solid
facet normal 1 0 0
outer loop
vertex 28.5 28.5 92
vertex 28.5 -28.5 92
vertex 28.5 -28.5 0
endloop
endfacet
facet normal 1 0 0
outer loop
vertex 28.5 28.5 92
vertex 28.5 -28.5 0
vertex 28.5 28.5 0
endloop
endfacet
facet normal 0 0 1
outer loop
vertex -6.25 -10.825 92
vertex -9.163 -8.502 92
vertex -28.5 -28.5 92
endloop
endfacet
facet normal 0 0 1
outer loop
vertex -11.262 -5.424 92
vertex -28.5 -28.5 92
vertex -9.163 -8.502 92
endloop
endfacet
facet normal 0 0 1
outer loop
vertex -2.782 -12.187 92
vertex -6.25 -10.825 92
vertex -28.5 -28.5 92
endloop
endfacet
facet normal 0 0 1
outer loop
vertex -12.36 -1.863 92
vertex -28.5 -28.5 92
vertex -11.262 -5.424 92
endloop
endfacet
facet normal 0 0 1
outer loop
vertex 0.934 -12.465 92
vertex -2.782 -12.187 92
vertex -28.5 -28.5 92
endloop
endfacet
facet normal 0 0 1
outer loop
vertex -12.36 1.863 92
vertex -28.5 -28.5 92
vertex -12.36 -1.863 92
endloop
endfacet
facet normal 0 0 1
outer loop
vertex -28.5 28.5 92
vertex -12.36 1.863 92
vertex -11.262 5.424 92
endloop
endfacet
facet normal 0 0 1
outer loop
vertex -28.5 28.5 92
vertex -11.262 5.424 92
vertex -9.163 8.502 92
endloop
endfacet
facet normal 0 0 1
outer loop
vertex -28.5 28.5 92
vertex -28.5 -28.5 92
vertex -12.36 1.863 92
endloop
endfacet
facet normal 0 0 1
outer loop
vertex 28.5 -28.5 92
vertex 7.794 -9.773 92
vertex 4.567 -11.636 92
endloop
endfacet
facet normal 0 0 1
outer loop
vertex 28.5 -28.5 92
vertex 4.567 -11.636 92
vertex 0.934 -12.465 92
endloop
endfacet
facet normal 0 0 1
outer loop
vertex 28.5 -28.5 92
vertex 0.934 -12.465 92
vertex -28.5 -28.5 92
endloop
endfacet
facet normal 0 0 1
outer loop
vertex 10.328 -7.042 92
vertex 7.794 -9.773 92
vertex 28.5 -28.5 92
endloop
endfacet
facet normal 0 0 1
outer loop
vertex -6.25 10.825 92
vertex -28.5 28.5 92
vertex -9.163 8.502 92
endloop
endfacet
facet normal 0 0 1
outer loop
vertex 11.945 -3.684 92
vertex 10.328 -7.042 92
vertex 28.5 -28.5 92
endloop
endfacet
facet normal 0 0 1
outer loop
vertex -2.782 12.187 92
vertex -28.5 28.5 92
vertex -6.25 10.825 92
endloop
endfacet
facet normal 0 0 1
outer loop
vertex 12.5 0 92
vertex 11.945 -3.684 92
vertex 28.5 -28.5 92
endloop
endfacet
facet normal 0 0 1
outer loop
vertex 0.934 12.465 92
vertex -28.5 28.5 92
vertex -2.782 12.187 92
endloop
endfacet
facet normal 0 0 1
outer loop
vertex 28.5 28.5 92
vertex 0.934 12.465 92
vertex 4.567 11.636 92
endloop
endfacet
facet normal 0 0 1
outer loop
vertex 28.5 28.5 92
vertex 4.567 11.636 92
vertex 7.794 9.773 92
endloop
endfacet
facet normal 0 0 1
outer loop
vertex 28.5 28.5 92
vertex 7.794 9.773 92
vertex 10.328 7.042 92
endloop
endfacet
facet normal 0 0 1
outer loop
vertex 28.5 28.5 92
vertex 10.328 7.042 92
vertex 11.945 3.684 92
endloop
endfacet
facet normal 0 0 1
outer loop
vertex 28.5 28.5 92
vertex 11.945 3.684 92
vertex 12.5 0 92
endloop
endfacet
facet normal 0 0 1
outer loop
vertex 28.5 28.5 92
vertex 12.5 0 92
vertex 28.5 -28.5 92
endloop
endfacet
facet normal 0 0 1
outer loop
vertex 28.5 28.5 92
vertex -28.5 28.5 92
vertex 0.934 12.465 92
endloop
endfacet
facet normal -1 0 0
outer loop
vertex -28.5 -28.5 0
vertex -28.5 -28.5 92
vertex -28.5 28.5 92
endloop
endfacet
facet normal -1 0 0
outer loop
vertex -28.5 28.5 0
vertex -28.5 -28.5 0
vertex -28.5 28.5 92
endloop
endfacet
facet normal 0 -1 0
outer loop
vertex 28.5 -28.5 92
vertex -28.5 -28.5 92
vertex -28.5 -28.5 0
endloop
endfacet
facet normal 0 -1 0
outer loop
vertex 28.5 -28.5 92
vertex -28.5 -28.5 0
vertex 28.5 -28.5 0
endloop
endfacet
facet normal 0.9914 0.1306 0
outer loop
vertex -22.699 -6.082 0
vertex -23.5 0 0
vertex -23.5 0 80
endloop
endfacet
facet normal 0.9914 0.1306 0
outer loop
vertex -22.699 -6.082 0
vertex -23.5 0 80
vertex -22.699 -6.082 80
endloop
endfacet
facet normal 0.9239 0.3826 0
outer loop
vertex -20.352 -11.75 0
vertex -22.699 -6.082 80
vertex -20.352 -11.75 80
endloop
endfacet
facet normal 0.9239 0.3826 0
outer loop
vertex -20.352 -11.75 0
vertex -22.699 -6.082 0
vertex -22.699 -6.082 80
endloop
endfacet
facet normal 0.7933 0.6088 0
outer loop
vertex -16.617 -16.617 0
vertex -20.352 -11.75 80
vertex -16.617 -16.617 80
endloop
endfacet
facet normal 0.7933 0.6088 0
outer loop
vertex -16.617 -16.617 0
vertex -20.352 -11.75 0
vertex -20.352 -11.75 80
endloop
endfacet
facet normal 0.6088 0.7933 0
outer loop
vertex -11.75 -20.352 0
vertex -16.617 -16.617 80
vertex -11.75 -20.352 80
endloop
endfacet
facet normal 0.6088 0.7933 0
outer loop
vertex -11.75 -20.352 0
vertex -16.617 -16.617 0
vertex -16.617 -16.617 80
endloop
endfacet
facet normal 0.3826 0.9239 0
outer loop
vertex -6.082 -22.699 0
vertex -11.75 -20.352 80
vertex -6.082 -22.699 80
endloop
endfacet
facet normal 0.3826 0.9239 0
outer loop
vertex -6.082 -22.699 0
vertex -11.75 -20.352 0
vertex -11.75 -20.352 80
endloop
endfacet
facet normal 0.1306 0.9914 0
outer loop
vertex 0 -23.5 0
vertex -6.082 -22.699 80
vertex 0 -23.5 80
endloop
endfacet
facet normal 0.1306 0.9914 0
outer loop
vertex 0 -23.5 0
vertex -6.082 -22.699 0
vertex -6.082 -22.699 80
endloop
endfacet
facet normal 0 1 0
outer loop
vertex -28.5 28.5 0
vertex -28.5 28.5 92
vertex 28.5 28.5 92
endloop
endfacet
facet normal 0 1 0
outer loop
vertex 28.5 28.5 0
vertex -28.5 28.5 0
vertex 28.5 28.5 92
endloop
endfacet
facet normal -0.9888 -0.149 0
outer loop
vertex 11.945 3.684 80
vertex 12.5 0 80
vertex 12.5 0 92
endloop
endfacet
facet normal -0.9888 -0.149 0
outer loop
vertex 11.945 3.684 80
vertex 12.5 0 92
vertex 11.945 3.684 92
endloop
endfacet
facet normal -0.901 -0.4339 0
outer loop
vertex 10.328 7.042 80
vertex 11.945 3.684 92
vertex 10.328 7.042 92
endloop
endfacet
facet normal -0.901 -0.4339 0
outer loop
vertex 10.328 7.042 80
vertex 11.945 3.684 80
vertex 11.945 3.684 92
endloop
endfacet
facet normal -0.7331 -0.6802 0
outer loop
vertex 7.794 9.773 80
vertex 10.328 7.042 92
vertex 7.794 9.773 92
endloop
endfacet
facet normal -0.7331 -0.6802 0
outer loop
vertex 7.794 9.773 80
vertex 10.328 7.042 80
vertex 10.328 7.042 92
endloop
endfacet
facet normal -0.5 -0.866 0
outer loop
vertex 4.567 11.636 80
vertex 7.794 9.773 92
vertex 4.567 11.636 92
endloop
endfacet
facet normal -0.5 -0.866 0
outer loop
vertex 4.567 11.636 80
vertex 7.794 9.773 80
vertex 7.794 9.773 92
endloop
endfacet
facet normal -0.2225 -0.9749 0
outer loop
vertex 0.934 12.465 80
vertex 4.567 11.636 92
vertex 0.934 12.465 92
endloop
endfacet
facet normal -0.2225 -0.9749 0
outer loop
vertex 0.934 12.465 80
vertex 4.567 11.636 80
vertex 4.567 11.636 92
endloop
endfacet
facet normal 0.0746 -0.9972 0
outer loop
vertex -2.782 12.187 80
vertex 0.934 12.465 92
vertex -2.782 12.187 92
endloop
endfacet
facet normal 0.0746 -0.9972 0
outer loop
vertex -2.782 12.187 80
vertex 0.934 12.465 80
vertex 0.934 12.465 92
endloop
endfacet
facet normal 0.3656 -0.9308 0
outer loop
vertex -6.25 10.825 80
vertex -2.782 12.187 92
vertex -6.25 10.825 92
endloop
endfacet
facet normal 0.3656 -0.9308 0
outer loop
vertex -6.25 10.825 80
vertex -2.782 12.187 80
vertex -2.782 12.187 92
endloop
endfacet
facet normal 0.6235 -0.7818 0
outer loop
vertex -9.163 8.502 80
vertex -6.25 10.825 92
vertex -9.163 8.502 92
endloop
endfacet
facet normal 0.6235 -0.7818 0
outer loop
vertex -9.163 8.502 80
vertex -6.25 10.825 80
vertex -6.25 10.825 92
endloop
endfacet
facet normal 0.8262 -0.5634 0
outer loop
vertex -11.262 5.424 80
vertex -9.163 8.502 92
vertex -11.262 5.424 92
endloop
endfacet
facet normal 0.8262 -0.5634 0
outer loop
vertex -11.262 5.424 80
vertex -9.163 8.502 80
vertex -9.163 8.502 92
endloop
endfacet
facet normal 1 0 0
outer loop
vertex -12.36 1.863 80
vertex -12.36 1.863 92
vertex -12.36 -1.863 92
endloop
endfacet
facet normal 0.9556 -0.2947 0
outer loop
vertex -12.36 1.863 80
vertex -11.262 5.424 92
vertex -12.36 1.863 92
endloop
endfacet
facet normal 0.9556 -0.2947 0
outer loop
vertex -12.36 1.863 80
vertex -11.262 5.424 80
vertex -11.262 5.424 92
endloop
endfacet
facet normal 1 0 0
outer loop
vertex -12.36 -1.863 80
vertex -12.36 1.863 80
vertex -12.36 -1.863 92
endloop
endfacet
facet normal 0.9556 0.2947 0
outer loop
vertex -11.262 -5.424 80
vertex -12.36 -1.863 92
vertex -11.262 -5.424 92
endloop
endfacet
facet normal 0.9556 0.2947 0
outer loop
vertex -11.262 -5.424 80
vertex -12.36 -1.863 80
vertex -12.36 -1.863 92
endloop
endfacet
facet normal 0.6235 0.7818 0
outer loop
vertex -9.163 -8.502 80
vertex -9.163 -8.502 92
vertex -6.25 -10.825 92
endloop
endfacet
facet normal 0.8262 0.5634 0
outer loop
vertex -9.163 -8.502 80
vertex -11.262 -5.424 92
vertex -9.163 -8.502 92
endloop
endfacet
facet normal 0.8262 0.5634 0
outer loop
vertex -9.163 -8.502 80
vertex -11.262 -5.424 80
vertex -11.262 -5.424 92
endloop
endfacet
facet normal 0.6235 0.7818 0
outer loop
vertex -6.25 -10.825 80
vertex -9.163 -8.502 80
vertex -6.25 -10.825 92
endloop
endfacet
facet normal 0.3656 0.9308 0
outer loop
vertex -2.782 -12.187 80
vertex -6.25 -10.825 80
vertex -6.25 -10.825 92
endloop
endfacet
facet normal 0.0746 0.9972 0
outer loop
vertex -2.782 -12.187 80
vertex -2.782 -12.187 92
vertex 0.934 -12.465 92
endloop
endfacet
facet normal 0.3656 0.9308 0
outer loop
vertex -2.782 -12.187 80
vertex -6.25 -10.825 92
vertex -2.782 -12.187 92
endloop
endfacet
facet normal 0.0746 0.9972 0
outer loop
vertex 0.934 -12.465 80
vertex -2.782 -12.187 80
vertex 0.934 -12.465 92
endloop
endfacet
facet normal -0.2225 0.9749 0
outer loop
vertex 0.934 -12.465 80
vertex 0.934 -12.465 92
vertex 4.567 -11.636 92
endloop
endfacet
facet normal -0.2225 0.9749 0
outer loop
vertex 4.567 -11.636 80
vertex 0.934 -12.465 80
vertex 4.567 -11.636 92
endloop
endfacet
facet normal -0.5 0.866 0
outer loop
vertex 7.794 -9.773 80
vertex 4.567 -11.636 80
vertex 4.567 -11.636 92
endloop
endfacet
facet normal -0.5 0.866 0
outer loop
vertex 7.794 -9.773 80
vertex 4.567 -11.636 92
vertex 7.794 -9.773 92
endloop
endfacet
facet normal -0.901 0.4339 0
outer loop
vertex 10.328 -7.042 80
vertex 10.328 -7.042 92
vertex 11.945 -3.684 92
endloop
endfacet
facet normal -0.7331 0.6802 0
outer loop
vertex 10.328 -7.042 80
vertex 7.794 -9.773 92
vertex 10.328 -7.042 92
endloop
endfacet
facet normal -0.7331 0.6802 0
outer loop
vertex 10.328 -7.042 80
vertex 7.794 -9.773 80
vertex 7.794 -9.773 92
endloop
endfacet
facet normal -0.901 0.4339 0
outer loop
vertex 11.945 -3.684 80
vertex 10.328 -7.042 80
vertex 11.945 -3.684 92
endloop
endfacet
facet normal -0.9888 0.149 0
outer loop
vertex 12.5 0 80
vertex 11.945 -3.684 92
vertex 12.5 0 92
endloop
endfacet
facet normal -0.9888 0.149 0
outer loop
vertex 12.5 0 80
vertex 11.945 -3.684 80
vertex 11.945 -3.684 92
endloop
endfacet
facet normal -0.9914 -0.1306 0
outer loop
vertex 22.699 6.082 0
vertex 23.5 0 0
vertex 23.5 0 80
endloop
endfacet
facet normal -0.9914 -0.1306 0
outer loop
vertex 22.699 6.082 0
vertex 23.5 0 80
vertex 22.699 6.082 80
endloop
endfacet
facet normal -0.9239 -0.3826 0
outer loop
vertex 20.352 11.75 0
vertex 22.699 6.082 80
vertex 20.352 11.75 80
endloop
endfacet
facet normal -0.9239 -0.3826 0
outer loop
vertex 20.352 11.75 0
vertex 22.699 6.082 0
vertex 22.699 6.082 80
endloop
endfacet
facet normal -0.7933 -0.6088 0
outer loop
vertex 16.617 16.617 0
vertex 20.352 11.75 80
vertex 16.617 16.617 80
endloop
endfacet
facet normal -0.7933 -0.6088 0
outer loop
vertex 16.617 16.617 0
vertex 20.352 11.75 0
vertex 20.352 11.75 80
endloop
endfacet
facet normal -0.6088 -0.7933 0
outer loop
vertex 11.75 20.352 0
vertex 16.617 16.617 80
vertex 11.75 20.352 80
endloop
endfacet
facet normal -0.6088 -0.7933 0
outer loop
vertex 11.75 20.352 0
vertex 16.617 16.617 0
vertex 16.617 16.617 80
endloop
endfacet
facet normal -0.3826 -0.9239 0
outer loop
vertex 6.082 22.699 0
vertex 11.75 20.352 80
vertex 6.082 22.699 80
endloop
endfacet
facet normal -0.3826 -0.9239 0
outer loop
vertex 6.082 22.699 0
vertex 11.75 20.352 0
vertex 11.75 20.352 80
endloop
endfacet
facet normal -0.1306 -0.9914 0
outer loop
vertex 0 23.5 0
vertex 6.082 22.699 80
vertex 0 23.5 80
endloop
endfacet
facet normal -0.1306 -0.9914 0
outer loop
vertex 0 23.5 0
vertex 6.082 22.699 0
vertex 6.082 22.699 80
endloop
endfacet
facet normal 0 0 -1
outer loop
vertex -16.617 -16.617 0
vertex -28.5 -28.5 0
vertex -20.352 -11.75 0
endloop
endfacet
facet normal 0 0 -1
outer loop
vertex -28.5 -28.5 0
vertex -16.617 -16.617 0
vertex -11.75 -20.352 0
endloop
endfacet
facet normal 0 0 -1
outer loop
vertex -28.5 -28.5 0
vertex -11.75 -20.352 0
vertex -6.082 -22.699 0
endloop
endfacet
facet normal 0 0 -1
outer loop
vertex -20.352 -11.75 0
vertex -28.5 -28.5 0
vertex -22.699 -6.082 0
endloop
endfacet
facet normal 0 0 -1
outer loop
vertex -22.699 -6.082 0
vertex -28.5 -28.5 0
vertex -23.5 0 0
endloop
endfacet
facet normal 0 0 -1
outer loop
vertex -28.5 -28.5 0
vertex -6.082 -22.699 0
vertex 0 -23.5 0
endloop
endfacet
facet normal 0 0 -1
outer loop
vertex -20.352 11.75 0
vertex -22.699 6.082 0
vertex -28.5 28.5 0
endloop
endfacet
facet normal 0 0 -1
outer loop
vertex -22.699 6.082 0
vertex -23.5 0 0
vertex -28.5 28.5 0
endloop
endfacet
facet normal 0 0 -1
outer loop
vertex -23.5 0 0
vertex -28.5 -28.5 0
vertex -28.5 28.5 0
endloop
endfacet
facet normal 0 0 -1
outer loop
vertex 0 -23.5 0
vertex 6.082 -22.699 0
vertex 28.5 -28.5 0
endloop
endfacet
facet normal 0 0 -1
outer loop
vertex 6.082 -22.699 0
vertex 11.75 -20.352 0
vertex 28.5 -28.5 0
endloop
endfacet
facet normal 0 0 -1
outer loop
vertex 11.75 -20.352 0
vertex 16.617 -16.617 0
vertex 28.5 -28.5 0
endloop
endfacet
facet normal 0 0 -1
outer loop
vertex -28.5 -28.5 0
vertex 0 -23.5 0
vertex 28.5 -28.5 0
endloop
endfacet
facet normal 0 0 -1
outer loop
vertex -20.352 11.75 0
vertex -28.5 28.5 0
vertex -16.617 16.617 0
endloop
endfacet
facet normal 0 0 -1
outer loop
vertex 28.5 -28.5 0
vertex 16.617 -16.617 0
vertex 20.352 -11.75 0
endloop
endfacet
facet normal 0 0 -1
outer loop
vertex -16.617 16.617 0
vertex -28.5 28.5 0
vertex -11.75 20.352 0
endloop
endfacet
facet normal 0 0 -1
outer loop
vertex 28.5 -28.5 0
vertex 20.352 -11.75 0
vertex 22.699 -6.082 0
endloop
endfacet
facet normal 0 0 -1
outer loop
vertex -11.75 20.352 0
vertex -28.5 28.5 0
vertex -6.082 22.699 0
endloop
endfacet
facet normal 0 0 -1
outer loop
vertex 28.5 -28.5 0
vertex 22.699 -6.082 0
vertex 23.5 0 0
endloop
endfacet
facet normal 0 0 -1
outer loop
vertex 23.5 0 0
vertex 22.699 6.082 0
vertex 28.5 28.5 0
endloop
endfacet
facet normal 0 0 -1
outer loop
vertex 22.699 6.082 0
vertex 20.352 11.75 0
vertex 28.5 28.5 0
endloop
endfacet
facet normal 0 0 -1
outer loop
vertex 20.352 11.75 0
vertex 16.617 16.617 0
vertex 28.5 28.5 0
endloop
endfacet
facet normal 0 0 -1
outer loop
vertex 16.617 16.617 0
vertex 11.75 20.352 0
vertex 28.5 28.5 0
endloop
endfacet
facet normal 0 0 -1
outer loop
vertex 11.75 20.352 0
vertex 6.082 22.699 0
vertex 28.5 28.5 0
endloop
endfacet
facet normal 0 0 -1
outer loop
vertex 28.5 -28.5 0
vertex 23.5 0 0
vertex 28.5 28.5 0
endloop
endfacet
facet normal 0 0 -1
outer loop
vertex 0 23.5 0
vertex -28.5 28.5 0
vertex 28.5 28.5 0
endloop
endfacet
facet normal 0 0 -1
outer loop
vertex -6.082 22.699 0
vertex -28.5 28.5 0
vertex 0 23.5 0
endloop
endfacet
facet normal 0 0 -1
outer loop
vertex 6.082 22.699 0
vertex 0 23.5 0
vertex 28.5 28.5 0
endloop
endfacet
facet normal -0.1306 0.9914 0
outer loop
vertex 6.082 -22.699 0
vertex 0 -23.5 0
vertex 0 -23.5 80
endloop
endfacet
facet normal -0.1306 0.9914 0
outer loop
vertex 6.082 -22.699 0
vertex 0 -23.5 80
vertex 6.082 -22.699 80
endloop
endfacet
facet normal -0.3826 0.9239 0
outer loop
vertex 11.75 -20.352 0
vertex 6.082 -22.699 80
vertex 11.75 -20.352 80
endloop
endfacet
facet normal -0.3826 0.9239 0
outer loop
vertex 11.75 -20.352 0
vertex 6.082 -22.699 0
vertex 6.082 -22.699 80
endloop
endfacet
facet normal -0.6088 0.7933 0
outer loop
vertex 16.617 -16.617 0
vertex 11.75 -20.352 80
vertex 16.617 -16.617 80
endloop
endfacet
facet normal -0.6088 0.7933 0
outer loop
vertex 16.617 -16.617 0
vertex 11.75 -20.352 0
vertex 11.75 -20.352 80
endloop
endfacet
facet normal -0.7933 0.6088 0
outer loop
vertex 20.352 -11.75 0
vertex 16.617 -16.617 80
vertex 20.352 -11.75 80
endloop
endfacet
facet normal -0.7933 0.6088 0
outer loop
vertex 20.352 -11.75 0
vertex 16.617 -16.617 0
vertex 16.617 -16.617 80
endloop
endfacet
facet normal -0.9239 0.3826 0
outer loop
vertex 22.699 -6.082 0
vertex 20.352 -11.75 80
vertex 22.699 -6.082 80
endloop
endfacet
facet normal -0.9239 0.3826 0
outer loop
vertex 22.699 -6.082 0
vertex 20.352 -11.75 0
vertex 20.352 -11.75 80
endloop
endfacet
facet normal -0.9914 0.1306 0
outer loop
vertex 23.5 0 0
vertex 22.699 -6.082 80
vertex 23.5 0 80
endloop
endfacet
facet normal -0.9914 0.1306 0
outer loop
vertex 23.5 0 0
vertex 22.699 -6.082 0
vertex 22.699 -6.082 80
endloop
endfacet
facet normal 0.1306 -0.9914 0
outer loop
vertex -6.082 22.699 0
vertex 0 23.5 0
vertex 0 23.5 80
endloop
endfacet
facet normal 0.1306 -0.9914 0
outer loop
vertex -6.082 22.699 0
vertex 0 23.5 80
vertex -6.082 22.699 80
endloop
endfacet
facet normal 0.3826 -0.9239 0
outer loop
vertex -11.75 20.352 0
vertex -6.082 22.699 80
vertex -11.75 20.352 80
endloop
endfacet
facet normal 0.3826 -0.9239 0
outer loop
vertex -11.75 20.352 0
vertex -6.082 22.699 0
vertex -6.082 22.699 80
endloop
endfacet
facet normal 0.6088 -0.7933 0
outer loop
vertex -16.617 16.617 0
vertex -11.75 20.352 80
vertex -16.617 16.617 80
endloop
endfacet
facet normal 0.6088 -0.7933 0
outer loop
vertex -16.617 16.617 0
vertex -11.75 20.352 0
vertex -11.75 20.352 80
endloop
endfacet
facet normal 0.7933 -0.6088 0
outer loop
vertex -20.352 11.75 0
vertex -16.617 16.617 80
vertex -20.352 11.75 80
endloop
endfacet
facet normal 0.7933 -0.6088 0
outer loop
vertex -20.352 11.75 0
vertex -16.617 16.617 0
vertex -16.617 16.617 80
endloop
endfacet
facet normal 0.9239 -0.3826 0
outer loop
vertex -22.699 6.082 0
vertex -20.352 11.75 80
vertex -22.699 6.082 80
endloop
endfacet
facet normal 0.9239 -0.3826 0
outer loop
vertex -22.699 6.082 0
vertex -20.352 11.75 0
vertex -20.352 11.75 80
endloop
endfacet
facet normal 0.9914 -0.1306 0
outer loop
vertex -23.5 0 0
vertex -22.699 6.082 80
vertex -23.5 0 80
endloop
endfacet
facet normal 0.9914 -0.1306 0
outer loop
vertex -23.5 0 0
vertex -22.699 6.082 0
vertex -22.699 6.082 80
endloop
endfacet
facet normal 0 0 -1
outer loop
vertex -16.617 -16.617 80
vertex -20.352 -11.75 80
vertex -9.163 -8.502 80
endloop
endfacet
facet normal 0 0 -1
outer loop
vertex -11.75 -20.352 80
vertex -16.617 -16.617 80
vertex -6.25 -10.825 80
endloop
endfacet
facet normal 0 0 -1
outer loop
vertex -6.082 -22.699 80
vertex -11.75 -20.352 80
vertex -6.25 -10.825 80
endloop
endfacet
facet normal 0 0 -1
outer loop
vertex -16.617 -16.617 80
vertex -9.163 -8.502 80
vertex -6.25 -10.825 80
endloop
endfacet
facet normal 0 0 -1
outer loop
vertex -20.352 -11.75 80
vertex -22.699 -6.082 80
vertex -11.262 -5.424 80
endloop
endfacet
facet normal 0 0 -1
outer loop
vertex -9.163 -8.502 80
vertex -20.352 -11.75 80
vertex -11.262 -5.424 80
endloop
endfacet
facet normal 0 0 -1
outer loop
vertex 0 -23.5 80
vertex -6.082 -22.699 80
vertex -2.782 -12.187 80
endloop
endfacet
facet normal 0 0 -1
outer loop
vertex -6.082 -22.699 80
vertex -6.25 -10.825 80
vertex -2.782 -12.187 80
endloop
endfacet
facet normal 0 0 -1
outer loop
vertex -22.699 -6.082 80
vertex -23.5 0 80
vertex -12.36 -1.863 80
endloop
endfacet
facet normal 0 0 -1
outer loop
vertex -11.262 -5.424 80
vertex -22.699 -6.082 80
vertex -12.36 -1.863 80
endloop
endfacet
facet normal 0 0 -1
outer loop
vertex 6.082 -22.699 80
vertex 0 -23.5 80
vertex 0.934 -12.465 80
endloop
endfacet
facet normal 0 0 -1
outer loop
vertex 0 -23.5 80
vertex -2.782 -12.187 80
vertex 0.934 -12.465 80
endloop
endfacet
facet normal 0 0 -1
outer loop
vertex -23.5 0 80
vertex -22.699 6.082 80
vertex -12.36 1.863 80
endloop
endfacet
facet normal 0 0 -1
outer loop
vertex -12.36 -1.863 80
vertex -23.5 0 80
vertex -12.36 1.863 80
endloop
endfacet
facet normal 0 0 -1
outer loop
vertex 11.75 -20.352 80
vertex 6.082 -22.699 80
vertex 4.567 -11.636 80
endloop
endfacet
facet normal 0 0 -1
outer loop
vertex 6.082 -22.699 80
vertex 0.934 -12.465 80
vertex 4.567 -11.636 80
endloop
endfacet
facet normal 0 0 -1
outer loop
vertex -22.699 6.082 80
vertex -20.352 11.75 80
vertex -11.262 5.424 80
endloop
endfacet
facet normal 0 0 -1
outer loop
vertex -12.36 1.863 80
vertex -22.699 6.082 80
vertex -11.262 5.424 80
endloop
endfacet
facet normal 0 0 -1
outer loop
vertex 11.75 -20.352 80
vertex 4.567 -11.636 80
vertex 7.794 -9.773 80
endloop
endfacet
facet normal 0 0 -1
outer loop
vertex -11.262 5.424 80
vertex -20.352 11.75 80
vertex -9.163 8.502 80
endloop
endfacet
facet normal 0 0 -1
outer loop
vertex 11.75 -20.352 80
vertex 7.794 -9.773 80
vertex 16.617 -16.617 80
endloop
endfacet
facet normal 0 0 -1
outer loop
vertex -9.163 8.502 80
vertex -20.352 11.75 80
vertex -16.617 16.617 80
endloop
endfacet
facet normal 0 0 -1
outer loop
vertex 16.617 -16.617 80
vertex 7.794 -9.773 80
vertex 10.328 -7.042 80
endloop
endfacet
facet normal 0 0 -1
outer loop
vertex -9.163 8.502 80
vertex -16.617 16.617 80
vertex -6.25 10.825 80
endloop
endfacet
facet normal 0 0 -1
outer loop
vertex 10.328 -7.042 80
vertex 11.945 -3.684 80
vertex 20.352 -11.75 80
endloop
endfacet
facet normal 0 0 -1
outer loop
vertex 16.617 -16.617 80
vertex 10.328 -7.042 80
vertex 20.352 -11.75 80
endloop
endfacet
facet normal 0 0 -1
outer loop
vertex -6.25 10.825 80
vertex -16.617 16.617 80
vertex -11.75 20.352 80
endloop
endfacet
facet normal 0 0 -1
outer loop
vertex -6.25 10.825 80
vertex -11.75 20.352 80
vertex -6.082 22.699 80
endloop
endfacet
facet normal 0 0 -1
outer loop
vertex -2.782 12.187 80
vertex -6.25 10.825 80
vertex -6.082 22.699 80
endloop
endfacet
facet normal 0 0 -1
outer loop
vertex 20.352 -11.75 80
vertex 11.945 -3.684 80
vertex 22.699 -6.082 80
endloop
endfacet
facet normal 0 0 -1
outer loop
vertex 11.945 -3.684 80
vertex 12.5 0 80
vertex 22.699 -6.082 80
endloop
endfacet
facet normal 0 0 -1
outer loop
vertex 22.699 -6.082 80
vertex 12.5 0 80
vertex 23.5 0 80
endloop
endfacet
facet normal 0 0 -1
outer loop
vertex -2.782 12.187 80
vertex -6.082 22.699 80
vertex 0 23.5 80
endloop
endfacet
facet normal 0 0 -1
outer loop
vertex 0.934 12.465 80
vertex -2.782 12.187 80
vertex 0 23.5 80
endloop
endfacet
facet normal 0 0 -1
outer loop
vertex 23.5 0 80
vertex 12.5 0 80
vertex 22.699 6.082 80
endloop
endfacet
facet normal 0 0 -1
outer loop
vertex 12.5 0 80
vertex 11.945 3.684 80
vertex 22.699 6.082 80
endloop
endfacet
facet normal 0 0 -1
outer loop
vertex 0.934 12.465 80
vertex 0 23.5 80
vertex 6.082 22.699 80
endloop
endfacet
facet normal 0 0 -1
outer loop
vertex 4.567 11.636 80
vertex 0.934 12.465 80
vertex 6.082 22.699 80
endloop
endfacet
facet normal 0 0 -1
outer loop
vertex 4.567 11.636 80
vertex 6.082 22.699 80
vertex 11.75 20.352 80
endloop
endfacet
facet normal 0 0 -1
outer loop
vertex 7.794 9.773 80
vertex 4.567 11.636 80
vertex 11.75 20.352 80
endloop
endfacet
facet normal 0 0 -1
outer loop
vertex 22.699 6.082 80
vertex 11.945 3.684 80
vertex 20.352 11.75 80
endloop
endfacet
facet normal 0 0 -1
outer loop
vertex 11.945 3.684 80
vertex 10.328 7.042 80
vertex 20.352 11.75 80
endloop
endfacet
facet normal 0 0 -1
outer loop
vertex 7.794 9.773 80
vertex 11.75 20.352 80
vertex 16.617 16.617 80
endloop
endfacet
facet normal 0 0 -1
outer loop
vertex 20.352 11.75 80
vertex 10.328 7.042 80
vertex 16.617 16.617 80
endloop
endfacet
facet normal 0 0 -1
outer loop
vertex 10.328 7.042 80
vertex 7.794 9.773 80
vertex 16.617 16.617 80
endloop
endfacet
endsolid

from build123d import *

# Parameters (mm, degrees)
F0_W     = 57
F0_H     = 57
F0_R     = 12.5
F1_DEPTH = 92
F2_DEPTH = 80
F3_DEPTH = 92.001


with BuildPart() as f1:
    # F0 (on Top) → F1 (new body)
    with BuildSketch(Plane.XY):
        Rectangle(F0_W, F0_H)
        Polygon((0, 23.5), (23.5, 23.5), (23.5, 0), (23.5, -23.5), (0, -23.5), (-23.5, -23.5), (-23.5, 0), (-23.5, 23.5), align=None, mode=Mode.SUBTRACT)
        with BuildLine():
            ThreePointArc((-23.5, 0), (-16.617009, 16.617009), (0, 23.5))
            Line((0, 23.5), (-23.5, 23.5))
            Line((-23.5, 23.5), (-23.5, 0))
        make_face()
        with BuildLine():
            Line((23.5, 0), (23.5, 23.5))
            Line((23.5, 23.5), (0, 23.5))
            ThreePointArc((0, 23.5), (16.617009, 16.617009), (23.5, 0))
        make_face()
        with BuildLine():
            Line((23.5, -23.5), (23.5, 0))
            ThreePointArc((23.5, 0), (16.617009, -16.617009), (0, -23.5))
            Line((0, -23.5), (23.5, -23.5))
        make_face()
        with BuildLine():
            ThreePointArc((0, -23.5), (-16.617009, -16.617009), (-23.5, 0))
            Line((-23.5, 0), (-23.5, -23.5))
            Line((-23.5, -23.5), (0, -23.5))
        make_face()
        with BuildLine():
            ThreePointArc((23.5, 0), (16.617009, 16.617009), (0, 23.5))
            ThreePointArc((0, 23.5), (-16.617009, 16.617009), (-23.5, 0))
            ThreePointArc((-23.5, 0), (-16.617009, -16.617009), (0, -23.5))
            ThreePointArc((0, -23.5), (16.617009, -16.617009), (23.5, 0))
        make_face()
        Circle(F0_R, mode=Mode.SUBTRACT)
        Circle(F0_R)
    extrude(amount=F1_DEPTH)

    # F0 (on Top) → F2 (cut)
    with BuildSketch(Plane.XY):
        with BuildLine():
            ThreePointArc((23.5, 0), (16.617009, 16.617009), (0, 23.5))
            ThreePointArc((0, 23.5), (-16.617009, 16.617009), (-23.5, 0))
            ThreePointArc((-23.5, 0), (-16.617009, -16.617009), (0, -23.5))
            ThreePointArc((0, -23.5), (16.617009, -16.617009), (23.5, 0))
        make_face()
        Circle(F0_R, mode=Mode.SUBTRACT)
        Circle(F0_R)
    extrude(amount=F2_DEPTH, mode=Mode.SUBTRACT)

    # F0 (on Top) → F3 (cut, through all)
    with BuildSketch(Plane.XY):
        Circle(F0_R)
    extrude(amount=F3_DEPTH, mode=Mode.SUBTRACT)


solid = f1.part
